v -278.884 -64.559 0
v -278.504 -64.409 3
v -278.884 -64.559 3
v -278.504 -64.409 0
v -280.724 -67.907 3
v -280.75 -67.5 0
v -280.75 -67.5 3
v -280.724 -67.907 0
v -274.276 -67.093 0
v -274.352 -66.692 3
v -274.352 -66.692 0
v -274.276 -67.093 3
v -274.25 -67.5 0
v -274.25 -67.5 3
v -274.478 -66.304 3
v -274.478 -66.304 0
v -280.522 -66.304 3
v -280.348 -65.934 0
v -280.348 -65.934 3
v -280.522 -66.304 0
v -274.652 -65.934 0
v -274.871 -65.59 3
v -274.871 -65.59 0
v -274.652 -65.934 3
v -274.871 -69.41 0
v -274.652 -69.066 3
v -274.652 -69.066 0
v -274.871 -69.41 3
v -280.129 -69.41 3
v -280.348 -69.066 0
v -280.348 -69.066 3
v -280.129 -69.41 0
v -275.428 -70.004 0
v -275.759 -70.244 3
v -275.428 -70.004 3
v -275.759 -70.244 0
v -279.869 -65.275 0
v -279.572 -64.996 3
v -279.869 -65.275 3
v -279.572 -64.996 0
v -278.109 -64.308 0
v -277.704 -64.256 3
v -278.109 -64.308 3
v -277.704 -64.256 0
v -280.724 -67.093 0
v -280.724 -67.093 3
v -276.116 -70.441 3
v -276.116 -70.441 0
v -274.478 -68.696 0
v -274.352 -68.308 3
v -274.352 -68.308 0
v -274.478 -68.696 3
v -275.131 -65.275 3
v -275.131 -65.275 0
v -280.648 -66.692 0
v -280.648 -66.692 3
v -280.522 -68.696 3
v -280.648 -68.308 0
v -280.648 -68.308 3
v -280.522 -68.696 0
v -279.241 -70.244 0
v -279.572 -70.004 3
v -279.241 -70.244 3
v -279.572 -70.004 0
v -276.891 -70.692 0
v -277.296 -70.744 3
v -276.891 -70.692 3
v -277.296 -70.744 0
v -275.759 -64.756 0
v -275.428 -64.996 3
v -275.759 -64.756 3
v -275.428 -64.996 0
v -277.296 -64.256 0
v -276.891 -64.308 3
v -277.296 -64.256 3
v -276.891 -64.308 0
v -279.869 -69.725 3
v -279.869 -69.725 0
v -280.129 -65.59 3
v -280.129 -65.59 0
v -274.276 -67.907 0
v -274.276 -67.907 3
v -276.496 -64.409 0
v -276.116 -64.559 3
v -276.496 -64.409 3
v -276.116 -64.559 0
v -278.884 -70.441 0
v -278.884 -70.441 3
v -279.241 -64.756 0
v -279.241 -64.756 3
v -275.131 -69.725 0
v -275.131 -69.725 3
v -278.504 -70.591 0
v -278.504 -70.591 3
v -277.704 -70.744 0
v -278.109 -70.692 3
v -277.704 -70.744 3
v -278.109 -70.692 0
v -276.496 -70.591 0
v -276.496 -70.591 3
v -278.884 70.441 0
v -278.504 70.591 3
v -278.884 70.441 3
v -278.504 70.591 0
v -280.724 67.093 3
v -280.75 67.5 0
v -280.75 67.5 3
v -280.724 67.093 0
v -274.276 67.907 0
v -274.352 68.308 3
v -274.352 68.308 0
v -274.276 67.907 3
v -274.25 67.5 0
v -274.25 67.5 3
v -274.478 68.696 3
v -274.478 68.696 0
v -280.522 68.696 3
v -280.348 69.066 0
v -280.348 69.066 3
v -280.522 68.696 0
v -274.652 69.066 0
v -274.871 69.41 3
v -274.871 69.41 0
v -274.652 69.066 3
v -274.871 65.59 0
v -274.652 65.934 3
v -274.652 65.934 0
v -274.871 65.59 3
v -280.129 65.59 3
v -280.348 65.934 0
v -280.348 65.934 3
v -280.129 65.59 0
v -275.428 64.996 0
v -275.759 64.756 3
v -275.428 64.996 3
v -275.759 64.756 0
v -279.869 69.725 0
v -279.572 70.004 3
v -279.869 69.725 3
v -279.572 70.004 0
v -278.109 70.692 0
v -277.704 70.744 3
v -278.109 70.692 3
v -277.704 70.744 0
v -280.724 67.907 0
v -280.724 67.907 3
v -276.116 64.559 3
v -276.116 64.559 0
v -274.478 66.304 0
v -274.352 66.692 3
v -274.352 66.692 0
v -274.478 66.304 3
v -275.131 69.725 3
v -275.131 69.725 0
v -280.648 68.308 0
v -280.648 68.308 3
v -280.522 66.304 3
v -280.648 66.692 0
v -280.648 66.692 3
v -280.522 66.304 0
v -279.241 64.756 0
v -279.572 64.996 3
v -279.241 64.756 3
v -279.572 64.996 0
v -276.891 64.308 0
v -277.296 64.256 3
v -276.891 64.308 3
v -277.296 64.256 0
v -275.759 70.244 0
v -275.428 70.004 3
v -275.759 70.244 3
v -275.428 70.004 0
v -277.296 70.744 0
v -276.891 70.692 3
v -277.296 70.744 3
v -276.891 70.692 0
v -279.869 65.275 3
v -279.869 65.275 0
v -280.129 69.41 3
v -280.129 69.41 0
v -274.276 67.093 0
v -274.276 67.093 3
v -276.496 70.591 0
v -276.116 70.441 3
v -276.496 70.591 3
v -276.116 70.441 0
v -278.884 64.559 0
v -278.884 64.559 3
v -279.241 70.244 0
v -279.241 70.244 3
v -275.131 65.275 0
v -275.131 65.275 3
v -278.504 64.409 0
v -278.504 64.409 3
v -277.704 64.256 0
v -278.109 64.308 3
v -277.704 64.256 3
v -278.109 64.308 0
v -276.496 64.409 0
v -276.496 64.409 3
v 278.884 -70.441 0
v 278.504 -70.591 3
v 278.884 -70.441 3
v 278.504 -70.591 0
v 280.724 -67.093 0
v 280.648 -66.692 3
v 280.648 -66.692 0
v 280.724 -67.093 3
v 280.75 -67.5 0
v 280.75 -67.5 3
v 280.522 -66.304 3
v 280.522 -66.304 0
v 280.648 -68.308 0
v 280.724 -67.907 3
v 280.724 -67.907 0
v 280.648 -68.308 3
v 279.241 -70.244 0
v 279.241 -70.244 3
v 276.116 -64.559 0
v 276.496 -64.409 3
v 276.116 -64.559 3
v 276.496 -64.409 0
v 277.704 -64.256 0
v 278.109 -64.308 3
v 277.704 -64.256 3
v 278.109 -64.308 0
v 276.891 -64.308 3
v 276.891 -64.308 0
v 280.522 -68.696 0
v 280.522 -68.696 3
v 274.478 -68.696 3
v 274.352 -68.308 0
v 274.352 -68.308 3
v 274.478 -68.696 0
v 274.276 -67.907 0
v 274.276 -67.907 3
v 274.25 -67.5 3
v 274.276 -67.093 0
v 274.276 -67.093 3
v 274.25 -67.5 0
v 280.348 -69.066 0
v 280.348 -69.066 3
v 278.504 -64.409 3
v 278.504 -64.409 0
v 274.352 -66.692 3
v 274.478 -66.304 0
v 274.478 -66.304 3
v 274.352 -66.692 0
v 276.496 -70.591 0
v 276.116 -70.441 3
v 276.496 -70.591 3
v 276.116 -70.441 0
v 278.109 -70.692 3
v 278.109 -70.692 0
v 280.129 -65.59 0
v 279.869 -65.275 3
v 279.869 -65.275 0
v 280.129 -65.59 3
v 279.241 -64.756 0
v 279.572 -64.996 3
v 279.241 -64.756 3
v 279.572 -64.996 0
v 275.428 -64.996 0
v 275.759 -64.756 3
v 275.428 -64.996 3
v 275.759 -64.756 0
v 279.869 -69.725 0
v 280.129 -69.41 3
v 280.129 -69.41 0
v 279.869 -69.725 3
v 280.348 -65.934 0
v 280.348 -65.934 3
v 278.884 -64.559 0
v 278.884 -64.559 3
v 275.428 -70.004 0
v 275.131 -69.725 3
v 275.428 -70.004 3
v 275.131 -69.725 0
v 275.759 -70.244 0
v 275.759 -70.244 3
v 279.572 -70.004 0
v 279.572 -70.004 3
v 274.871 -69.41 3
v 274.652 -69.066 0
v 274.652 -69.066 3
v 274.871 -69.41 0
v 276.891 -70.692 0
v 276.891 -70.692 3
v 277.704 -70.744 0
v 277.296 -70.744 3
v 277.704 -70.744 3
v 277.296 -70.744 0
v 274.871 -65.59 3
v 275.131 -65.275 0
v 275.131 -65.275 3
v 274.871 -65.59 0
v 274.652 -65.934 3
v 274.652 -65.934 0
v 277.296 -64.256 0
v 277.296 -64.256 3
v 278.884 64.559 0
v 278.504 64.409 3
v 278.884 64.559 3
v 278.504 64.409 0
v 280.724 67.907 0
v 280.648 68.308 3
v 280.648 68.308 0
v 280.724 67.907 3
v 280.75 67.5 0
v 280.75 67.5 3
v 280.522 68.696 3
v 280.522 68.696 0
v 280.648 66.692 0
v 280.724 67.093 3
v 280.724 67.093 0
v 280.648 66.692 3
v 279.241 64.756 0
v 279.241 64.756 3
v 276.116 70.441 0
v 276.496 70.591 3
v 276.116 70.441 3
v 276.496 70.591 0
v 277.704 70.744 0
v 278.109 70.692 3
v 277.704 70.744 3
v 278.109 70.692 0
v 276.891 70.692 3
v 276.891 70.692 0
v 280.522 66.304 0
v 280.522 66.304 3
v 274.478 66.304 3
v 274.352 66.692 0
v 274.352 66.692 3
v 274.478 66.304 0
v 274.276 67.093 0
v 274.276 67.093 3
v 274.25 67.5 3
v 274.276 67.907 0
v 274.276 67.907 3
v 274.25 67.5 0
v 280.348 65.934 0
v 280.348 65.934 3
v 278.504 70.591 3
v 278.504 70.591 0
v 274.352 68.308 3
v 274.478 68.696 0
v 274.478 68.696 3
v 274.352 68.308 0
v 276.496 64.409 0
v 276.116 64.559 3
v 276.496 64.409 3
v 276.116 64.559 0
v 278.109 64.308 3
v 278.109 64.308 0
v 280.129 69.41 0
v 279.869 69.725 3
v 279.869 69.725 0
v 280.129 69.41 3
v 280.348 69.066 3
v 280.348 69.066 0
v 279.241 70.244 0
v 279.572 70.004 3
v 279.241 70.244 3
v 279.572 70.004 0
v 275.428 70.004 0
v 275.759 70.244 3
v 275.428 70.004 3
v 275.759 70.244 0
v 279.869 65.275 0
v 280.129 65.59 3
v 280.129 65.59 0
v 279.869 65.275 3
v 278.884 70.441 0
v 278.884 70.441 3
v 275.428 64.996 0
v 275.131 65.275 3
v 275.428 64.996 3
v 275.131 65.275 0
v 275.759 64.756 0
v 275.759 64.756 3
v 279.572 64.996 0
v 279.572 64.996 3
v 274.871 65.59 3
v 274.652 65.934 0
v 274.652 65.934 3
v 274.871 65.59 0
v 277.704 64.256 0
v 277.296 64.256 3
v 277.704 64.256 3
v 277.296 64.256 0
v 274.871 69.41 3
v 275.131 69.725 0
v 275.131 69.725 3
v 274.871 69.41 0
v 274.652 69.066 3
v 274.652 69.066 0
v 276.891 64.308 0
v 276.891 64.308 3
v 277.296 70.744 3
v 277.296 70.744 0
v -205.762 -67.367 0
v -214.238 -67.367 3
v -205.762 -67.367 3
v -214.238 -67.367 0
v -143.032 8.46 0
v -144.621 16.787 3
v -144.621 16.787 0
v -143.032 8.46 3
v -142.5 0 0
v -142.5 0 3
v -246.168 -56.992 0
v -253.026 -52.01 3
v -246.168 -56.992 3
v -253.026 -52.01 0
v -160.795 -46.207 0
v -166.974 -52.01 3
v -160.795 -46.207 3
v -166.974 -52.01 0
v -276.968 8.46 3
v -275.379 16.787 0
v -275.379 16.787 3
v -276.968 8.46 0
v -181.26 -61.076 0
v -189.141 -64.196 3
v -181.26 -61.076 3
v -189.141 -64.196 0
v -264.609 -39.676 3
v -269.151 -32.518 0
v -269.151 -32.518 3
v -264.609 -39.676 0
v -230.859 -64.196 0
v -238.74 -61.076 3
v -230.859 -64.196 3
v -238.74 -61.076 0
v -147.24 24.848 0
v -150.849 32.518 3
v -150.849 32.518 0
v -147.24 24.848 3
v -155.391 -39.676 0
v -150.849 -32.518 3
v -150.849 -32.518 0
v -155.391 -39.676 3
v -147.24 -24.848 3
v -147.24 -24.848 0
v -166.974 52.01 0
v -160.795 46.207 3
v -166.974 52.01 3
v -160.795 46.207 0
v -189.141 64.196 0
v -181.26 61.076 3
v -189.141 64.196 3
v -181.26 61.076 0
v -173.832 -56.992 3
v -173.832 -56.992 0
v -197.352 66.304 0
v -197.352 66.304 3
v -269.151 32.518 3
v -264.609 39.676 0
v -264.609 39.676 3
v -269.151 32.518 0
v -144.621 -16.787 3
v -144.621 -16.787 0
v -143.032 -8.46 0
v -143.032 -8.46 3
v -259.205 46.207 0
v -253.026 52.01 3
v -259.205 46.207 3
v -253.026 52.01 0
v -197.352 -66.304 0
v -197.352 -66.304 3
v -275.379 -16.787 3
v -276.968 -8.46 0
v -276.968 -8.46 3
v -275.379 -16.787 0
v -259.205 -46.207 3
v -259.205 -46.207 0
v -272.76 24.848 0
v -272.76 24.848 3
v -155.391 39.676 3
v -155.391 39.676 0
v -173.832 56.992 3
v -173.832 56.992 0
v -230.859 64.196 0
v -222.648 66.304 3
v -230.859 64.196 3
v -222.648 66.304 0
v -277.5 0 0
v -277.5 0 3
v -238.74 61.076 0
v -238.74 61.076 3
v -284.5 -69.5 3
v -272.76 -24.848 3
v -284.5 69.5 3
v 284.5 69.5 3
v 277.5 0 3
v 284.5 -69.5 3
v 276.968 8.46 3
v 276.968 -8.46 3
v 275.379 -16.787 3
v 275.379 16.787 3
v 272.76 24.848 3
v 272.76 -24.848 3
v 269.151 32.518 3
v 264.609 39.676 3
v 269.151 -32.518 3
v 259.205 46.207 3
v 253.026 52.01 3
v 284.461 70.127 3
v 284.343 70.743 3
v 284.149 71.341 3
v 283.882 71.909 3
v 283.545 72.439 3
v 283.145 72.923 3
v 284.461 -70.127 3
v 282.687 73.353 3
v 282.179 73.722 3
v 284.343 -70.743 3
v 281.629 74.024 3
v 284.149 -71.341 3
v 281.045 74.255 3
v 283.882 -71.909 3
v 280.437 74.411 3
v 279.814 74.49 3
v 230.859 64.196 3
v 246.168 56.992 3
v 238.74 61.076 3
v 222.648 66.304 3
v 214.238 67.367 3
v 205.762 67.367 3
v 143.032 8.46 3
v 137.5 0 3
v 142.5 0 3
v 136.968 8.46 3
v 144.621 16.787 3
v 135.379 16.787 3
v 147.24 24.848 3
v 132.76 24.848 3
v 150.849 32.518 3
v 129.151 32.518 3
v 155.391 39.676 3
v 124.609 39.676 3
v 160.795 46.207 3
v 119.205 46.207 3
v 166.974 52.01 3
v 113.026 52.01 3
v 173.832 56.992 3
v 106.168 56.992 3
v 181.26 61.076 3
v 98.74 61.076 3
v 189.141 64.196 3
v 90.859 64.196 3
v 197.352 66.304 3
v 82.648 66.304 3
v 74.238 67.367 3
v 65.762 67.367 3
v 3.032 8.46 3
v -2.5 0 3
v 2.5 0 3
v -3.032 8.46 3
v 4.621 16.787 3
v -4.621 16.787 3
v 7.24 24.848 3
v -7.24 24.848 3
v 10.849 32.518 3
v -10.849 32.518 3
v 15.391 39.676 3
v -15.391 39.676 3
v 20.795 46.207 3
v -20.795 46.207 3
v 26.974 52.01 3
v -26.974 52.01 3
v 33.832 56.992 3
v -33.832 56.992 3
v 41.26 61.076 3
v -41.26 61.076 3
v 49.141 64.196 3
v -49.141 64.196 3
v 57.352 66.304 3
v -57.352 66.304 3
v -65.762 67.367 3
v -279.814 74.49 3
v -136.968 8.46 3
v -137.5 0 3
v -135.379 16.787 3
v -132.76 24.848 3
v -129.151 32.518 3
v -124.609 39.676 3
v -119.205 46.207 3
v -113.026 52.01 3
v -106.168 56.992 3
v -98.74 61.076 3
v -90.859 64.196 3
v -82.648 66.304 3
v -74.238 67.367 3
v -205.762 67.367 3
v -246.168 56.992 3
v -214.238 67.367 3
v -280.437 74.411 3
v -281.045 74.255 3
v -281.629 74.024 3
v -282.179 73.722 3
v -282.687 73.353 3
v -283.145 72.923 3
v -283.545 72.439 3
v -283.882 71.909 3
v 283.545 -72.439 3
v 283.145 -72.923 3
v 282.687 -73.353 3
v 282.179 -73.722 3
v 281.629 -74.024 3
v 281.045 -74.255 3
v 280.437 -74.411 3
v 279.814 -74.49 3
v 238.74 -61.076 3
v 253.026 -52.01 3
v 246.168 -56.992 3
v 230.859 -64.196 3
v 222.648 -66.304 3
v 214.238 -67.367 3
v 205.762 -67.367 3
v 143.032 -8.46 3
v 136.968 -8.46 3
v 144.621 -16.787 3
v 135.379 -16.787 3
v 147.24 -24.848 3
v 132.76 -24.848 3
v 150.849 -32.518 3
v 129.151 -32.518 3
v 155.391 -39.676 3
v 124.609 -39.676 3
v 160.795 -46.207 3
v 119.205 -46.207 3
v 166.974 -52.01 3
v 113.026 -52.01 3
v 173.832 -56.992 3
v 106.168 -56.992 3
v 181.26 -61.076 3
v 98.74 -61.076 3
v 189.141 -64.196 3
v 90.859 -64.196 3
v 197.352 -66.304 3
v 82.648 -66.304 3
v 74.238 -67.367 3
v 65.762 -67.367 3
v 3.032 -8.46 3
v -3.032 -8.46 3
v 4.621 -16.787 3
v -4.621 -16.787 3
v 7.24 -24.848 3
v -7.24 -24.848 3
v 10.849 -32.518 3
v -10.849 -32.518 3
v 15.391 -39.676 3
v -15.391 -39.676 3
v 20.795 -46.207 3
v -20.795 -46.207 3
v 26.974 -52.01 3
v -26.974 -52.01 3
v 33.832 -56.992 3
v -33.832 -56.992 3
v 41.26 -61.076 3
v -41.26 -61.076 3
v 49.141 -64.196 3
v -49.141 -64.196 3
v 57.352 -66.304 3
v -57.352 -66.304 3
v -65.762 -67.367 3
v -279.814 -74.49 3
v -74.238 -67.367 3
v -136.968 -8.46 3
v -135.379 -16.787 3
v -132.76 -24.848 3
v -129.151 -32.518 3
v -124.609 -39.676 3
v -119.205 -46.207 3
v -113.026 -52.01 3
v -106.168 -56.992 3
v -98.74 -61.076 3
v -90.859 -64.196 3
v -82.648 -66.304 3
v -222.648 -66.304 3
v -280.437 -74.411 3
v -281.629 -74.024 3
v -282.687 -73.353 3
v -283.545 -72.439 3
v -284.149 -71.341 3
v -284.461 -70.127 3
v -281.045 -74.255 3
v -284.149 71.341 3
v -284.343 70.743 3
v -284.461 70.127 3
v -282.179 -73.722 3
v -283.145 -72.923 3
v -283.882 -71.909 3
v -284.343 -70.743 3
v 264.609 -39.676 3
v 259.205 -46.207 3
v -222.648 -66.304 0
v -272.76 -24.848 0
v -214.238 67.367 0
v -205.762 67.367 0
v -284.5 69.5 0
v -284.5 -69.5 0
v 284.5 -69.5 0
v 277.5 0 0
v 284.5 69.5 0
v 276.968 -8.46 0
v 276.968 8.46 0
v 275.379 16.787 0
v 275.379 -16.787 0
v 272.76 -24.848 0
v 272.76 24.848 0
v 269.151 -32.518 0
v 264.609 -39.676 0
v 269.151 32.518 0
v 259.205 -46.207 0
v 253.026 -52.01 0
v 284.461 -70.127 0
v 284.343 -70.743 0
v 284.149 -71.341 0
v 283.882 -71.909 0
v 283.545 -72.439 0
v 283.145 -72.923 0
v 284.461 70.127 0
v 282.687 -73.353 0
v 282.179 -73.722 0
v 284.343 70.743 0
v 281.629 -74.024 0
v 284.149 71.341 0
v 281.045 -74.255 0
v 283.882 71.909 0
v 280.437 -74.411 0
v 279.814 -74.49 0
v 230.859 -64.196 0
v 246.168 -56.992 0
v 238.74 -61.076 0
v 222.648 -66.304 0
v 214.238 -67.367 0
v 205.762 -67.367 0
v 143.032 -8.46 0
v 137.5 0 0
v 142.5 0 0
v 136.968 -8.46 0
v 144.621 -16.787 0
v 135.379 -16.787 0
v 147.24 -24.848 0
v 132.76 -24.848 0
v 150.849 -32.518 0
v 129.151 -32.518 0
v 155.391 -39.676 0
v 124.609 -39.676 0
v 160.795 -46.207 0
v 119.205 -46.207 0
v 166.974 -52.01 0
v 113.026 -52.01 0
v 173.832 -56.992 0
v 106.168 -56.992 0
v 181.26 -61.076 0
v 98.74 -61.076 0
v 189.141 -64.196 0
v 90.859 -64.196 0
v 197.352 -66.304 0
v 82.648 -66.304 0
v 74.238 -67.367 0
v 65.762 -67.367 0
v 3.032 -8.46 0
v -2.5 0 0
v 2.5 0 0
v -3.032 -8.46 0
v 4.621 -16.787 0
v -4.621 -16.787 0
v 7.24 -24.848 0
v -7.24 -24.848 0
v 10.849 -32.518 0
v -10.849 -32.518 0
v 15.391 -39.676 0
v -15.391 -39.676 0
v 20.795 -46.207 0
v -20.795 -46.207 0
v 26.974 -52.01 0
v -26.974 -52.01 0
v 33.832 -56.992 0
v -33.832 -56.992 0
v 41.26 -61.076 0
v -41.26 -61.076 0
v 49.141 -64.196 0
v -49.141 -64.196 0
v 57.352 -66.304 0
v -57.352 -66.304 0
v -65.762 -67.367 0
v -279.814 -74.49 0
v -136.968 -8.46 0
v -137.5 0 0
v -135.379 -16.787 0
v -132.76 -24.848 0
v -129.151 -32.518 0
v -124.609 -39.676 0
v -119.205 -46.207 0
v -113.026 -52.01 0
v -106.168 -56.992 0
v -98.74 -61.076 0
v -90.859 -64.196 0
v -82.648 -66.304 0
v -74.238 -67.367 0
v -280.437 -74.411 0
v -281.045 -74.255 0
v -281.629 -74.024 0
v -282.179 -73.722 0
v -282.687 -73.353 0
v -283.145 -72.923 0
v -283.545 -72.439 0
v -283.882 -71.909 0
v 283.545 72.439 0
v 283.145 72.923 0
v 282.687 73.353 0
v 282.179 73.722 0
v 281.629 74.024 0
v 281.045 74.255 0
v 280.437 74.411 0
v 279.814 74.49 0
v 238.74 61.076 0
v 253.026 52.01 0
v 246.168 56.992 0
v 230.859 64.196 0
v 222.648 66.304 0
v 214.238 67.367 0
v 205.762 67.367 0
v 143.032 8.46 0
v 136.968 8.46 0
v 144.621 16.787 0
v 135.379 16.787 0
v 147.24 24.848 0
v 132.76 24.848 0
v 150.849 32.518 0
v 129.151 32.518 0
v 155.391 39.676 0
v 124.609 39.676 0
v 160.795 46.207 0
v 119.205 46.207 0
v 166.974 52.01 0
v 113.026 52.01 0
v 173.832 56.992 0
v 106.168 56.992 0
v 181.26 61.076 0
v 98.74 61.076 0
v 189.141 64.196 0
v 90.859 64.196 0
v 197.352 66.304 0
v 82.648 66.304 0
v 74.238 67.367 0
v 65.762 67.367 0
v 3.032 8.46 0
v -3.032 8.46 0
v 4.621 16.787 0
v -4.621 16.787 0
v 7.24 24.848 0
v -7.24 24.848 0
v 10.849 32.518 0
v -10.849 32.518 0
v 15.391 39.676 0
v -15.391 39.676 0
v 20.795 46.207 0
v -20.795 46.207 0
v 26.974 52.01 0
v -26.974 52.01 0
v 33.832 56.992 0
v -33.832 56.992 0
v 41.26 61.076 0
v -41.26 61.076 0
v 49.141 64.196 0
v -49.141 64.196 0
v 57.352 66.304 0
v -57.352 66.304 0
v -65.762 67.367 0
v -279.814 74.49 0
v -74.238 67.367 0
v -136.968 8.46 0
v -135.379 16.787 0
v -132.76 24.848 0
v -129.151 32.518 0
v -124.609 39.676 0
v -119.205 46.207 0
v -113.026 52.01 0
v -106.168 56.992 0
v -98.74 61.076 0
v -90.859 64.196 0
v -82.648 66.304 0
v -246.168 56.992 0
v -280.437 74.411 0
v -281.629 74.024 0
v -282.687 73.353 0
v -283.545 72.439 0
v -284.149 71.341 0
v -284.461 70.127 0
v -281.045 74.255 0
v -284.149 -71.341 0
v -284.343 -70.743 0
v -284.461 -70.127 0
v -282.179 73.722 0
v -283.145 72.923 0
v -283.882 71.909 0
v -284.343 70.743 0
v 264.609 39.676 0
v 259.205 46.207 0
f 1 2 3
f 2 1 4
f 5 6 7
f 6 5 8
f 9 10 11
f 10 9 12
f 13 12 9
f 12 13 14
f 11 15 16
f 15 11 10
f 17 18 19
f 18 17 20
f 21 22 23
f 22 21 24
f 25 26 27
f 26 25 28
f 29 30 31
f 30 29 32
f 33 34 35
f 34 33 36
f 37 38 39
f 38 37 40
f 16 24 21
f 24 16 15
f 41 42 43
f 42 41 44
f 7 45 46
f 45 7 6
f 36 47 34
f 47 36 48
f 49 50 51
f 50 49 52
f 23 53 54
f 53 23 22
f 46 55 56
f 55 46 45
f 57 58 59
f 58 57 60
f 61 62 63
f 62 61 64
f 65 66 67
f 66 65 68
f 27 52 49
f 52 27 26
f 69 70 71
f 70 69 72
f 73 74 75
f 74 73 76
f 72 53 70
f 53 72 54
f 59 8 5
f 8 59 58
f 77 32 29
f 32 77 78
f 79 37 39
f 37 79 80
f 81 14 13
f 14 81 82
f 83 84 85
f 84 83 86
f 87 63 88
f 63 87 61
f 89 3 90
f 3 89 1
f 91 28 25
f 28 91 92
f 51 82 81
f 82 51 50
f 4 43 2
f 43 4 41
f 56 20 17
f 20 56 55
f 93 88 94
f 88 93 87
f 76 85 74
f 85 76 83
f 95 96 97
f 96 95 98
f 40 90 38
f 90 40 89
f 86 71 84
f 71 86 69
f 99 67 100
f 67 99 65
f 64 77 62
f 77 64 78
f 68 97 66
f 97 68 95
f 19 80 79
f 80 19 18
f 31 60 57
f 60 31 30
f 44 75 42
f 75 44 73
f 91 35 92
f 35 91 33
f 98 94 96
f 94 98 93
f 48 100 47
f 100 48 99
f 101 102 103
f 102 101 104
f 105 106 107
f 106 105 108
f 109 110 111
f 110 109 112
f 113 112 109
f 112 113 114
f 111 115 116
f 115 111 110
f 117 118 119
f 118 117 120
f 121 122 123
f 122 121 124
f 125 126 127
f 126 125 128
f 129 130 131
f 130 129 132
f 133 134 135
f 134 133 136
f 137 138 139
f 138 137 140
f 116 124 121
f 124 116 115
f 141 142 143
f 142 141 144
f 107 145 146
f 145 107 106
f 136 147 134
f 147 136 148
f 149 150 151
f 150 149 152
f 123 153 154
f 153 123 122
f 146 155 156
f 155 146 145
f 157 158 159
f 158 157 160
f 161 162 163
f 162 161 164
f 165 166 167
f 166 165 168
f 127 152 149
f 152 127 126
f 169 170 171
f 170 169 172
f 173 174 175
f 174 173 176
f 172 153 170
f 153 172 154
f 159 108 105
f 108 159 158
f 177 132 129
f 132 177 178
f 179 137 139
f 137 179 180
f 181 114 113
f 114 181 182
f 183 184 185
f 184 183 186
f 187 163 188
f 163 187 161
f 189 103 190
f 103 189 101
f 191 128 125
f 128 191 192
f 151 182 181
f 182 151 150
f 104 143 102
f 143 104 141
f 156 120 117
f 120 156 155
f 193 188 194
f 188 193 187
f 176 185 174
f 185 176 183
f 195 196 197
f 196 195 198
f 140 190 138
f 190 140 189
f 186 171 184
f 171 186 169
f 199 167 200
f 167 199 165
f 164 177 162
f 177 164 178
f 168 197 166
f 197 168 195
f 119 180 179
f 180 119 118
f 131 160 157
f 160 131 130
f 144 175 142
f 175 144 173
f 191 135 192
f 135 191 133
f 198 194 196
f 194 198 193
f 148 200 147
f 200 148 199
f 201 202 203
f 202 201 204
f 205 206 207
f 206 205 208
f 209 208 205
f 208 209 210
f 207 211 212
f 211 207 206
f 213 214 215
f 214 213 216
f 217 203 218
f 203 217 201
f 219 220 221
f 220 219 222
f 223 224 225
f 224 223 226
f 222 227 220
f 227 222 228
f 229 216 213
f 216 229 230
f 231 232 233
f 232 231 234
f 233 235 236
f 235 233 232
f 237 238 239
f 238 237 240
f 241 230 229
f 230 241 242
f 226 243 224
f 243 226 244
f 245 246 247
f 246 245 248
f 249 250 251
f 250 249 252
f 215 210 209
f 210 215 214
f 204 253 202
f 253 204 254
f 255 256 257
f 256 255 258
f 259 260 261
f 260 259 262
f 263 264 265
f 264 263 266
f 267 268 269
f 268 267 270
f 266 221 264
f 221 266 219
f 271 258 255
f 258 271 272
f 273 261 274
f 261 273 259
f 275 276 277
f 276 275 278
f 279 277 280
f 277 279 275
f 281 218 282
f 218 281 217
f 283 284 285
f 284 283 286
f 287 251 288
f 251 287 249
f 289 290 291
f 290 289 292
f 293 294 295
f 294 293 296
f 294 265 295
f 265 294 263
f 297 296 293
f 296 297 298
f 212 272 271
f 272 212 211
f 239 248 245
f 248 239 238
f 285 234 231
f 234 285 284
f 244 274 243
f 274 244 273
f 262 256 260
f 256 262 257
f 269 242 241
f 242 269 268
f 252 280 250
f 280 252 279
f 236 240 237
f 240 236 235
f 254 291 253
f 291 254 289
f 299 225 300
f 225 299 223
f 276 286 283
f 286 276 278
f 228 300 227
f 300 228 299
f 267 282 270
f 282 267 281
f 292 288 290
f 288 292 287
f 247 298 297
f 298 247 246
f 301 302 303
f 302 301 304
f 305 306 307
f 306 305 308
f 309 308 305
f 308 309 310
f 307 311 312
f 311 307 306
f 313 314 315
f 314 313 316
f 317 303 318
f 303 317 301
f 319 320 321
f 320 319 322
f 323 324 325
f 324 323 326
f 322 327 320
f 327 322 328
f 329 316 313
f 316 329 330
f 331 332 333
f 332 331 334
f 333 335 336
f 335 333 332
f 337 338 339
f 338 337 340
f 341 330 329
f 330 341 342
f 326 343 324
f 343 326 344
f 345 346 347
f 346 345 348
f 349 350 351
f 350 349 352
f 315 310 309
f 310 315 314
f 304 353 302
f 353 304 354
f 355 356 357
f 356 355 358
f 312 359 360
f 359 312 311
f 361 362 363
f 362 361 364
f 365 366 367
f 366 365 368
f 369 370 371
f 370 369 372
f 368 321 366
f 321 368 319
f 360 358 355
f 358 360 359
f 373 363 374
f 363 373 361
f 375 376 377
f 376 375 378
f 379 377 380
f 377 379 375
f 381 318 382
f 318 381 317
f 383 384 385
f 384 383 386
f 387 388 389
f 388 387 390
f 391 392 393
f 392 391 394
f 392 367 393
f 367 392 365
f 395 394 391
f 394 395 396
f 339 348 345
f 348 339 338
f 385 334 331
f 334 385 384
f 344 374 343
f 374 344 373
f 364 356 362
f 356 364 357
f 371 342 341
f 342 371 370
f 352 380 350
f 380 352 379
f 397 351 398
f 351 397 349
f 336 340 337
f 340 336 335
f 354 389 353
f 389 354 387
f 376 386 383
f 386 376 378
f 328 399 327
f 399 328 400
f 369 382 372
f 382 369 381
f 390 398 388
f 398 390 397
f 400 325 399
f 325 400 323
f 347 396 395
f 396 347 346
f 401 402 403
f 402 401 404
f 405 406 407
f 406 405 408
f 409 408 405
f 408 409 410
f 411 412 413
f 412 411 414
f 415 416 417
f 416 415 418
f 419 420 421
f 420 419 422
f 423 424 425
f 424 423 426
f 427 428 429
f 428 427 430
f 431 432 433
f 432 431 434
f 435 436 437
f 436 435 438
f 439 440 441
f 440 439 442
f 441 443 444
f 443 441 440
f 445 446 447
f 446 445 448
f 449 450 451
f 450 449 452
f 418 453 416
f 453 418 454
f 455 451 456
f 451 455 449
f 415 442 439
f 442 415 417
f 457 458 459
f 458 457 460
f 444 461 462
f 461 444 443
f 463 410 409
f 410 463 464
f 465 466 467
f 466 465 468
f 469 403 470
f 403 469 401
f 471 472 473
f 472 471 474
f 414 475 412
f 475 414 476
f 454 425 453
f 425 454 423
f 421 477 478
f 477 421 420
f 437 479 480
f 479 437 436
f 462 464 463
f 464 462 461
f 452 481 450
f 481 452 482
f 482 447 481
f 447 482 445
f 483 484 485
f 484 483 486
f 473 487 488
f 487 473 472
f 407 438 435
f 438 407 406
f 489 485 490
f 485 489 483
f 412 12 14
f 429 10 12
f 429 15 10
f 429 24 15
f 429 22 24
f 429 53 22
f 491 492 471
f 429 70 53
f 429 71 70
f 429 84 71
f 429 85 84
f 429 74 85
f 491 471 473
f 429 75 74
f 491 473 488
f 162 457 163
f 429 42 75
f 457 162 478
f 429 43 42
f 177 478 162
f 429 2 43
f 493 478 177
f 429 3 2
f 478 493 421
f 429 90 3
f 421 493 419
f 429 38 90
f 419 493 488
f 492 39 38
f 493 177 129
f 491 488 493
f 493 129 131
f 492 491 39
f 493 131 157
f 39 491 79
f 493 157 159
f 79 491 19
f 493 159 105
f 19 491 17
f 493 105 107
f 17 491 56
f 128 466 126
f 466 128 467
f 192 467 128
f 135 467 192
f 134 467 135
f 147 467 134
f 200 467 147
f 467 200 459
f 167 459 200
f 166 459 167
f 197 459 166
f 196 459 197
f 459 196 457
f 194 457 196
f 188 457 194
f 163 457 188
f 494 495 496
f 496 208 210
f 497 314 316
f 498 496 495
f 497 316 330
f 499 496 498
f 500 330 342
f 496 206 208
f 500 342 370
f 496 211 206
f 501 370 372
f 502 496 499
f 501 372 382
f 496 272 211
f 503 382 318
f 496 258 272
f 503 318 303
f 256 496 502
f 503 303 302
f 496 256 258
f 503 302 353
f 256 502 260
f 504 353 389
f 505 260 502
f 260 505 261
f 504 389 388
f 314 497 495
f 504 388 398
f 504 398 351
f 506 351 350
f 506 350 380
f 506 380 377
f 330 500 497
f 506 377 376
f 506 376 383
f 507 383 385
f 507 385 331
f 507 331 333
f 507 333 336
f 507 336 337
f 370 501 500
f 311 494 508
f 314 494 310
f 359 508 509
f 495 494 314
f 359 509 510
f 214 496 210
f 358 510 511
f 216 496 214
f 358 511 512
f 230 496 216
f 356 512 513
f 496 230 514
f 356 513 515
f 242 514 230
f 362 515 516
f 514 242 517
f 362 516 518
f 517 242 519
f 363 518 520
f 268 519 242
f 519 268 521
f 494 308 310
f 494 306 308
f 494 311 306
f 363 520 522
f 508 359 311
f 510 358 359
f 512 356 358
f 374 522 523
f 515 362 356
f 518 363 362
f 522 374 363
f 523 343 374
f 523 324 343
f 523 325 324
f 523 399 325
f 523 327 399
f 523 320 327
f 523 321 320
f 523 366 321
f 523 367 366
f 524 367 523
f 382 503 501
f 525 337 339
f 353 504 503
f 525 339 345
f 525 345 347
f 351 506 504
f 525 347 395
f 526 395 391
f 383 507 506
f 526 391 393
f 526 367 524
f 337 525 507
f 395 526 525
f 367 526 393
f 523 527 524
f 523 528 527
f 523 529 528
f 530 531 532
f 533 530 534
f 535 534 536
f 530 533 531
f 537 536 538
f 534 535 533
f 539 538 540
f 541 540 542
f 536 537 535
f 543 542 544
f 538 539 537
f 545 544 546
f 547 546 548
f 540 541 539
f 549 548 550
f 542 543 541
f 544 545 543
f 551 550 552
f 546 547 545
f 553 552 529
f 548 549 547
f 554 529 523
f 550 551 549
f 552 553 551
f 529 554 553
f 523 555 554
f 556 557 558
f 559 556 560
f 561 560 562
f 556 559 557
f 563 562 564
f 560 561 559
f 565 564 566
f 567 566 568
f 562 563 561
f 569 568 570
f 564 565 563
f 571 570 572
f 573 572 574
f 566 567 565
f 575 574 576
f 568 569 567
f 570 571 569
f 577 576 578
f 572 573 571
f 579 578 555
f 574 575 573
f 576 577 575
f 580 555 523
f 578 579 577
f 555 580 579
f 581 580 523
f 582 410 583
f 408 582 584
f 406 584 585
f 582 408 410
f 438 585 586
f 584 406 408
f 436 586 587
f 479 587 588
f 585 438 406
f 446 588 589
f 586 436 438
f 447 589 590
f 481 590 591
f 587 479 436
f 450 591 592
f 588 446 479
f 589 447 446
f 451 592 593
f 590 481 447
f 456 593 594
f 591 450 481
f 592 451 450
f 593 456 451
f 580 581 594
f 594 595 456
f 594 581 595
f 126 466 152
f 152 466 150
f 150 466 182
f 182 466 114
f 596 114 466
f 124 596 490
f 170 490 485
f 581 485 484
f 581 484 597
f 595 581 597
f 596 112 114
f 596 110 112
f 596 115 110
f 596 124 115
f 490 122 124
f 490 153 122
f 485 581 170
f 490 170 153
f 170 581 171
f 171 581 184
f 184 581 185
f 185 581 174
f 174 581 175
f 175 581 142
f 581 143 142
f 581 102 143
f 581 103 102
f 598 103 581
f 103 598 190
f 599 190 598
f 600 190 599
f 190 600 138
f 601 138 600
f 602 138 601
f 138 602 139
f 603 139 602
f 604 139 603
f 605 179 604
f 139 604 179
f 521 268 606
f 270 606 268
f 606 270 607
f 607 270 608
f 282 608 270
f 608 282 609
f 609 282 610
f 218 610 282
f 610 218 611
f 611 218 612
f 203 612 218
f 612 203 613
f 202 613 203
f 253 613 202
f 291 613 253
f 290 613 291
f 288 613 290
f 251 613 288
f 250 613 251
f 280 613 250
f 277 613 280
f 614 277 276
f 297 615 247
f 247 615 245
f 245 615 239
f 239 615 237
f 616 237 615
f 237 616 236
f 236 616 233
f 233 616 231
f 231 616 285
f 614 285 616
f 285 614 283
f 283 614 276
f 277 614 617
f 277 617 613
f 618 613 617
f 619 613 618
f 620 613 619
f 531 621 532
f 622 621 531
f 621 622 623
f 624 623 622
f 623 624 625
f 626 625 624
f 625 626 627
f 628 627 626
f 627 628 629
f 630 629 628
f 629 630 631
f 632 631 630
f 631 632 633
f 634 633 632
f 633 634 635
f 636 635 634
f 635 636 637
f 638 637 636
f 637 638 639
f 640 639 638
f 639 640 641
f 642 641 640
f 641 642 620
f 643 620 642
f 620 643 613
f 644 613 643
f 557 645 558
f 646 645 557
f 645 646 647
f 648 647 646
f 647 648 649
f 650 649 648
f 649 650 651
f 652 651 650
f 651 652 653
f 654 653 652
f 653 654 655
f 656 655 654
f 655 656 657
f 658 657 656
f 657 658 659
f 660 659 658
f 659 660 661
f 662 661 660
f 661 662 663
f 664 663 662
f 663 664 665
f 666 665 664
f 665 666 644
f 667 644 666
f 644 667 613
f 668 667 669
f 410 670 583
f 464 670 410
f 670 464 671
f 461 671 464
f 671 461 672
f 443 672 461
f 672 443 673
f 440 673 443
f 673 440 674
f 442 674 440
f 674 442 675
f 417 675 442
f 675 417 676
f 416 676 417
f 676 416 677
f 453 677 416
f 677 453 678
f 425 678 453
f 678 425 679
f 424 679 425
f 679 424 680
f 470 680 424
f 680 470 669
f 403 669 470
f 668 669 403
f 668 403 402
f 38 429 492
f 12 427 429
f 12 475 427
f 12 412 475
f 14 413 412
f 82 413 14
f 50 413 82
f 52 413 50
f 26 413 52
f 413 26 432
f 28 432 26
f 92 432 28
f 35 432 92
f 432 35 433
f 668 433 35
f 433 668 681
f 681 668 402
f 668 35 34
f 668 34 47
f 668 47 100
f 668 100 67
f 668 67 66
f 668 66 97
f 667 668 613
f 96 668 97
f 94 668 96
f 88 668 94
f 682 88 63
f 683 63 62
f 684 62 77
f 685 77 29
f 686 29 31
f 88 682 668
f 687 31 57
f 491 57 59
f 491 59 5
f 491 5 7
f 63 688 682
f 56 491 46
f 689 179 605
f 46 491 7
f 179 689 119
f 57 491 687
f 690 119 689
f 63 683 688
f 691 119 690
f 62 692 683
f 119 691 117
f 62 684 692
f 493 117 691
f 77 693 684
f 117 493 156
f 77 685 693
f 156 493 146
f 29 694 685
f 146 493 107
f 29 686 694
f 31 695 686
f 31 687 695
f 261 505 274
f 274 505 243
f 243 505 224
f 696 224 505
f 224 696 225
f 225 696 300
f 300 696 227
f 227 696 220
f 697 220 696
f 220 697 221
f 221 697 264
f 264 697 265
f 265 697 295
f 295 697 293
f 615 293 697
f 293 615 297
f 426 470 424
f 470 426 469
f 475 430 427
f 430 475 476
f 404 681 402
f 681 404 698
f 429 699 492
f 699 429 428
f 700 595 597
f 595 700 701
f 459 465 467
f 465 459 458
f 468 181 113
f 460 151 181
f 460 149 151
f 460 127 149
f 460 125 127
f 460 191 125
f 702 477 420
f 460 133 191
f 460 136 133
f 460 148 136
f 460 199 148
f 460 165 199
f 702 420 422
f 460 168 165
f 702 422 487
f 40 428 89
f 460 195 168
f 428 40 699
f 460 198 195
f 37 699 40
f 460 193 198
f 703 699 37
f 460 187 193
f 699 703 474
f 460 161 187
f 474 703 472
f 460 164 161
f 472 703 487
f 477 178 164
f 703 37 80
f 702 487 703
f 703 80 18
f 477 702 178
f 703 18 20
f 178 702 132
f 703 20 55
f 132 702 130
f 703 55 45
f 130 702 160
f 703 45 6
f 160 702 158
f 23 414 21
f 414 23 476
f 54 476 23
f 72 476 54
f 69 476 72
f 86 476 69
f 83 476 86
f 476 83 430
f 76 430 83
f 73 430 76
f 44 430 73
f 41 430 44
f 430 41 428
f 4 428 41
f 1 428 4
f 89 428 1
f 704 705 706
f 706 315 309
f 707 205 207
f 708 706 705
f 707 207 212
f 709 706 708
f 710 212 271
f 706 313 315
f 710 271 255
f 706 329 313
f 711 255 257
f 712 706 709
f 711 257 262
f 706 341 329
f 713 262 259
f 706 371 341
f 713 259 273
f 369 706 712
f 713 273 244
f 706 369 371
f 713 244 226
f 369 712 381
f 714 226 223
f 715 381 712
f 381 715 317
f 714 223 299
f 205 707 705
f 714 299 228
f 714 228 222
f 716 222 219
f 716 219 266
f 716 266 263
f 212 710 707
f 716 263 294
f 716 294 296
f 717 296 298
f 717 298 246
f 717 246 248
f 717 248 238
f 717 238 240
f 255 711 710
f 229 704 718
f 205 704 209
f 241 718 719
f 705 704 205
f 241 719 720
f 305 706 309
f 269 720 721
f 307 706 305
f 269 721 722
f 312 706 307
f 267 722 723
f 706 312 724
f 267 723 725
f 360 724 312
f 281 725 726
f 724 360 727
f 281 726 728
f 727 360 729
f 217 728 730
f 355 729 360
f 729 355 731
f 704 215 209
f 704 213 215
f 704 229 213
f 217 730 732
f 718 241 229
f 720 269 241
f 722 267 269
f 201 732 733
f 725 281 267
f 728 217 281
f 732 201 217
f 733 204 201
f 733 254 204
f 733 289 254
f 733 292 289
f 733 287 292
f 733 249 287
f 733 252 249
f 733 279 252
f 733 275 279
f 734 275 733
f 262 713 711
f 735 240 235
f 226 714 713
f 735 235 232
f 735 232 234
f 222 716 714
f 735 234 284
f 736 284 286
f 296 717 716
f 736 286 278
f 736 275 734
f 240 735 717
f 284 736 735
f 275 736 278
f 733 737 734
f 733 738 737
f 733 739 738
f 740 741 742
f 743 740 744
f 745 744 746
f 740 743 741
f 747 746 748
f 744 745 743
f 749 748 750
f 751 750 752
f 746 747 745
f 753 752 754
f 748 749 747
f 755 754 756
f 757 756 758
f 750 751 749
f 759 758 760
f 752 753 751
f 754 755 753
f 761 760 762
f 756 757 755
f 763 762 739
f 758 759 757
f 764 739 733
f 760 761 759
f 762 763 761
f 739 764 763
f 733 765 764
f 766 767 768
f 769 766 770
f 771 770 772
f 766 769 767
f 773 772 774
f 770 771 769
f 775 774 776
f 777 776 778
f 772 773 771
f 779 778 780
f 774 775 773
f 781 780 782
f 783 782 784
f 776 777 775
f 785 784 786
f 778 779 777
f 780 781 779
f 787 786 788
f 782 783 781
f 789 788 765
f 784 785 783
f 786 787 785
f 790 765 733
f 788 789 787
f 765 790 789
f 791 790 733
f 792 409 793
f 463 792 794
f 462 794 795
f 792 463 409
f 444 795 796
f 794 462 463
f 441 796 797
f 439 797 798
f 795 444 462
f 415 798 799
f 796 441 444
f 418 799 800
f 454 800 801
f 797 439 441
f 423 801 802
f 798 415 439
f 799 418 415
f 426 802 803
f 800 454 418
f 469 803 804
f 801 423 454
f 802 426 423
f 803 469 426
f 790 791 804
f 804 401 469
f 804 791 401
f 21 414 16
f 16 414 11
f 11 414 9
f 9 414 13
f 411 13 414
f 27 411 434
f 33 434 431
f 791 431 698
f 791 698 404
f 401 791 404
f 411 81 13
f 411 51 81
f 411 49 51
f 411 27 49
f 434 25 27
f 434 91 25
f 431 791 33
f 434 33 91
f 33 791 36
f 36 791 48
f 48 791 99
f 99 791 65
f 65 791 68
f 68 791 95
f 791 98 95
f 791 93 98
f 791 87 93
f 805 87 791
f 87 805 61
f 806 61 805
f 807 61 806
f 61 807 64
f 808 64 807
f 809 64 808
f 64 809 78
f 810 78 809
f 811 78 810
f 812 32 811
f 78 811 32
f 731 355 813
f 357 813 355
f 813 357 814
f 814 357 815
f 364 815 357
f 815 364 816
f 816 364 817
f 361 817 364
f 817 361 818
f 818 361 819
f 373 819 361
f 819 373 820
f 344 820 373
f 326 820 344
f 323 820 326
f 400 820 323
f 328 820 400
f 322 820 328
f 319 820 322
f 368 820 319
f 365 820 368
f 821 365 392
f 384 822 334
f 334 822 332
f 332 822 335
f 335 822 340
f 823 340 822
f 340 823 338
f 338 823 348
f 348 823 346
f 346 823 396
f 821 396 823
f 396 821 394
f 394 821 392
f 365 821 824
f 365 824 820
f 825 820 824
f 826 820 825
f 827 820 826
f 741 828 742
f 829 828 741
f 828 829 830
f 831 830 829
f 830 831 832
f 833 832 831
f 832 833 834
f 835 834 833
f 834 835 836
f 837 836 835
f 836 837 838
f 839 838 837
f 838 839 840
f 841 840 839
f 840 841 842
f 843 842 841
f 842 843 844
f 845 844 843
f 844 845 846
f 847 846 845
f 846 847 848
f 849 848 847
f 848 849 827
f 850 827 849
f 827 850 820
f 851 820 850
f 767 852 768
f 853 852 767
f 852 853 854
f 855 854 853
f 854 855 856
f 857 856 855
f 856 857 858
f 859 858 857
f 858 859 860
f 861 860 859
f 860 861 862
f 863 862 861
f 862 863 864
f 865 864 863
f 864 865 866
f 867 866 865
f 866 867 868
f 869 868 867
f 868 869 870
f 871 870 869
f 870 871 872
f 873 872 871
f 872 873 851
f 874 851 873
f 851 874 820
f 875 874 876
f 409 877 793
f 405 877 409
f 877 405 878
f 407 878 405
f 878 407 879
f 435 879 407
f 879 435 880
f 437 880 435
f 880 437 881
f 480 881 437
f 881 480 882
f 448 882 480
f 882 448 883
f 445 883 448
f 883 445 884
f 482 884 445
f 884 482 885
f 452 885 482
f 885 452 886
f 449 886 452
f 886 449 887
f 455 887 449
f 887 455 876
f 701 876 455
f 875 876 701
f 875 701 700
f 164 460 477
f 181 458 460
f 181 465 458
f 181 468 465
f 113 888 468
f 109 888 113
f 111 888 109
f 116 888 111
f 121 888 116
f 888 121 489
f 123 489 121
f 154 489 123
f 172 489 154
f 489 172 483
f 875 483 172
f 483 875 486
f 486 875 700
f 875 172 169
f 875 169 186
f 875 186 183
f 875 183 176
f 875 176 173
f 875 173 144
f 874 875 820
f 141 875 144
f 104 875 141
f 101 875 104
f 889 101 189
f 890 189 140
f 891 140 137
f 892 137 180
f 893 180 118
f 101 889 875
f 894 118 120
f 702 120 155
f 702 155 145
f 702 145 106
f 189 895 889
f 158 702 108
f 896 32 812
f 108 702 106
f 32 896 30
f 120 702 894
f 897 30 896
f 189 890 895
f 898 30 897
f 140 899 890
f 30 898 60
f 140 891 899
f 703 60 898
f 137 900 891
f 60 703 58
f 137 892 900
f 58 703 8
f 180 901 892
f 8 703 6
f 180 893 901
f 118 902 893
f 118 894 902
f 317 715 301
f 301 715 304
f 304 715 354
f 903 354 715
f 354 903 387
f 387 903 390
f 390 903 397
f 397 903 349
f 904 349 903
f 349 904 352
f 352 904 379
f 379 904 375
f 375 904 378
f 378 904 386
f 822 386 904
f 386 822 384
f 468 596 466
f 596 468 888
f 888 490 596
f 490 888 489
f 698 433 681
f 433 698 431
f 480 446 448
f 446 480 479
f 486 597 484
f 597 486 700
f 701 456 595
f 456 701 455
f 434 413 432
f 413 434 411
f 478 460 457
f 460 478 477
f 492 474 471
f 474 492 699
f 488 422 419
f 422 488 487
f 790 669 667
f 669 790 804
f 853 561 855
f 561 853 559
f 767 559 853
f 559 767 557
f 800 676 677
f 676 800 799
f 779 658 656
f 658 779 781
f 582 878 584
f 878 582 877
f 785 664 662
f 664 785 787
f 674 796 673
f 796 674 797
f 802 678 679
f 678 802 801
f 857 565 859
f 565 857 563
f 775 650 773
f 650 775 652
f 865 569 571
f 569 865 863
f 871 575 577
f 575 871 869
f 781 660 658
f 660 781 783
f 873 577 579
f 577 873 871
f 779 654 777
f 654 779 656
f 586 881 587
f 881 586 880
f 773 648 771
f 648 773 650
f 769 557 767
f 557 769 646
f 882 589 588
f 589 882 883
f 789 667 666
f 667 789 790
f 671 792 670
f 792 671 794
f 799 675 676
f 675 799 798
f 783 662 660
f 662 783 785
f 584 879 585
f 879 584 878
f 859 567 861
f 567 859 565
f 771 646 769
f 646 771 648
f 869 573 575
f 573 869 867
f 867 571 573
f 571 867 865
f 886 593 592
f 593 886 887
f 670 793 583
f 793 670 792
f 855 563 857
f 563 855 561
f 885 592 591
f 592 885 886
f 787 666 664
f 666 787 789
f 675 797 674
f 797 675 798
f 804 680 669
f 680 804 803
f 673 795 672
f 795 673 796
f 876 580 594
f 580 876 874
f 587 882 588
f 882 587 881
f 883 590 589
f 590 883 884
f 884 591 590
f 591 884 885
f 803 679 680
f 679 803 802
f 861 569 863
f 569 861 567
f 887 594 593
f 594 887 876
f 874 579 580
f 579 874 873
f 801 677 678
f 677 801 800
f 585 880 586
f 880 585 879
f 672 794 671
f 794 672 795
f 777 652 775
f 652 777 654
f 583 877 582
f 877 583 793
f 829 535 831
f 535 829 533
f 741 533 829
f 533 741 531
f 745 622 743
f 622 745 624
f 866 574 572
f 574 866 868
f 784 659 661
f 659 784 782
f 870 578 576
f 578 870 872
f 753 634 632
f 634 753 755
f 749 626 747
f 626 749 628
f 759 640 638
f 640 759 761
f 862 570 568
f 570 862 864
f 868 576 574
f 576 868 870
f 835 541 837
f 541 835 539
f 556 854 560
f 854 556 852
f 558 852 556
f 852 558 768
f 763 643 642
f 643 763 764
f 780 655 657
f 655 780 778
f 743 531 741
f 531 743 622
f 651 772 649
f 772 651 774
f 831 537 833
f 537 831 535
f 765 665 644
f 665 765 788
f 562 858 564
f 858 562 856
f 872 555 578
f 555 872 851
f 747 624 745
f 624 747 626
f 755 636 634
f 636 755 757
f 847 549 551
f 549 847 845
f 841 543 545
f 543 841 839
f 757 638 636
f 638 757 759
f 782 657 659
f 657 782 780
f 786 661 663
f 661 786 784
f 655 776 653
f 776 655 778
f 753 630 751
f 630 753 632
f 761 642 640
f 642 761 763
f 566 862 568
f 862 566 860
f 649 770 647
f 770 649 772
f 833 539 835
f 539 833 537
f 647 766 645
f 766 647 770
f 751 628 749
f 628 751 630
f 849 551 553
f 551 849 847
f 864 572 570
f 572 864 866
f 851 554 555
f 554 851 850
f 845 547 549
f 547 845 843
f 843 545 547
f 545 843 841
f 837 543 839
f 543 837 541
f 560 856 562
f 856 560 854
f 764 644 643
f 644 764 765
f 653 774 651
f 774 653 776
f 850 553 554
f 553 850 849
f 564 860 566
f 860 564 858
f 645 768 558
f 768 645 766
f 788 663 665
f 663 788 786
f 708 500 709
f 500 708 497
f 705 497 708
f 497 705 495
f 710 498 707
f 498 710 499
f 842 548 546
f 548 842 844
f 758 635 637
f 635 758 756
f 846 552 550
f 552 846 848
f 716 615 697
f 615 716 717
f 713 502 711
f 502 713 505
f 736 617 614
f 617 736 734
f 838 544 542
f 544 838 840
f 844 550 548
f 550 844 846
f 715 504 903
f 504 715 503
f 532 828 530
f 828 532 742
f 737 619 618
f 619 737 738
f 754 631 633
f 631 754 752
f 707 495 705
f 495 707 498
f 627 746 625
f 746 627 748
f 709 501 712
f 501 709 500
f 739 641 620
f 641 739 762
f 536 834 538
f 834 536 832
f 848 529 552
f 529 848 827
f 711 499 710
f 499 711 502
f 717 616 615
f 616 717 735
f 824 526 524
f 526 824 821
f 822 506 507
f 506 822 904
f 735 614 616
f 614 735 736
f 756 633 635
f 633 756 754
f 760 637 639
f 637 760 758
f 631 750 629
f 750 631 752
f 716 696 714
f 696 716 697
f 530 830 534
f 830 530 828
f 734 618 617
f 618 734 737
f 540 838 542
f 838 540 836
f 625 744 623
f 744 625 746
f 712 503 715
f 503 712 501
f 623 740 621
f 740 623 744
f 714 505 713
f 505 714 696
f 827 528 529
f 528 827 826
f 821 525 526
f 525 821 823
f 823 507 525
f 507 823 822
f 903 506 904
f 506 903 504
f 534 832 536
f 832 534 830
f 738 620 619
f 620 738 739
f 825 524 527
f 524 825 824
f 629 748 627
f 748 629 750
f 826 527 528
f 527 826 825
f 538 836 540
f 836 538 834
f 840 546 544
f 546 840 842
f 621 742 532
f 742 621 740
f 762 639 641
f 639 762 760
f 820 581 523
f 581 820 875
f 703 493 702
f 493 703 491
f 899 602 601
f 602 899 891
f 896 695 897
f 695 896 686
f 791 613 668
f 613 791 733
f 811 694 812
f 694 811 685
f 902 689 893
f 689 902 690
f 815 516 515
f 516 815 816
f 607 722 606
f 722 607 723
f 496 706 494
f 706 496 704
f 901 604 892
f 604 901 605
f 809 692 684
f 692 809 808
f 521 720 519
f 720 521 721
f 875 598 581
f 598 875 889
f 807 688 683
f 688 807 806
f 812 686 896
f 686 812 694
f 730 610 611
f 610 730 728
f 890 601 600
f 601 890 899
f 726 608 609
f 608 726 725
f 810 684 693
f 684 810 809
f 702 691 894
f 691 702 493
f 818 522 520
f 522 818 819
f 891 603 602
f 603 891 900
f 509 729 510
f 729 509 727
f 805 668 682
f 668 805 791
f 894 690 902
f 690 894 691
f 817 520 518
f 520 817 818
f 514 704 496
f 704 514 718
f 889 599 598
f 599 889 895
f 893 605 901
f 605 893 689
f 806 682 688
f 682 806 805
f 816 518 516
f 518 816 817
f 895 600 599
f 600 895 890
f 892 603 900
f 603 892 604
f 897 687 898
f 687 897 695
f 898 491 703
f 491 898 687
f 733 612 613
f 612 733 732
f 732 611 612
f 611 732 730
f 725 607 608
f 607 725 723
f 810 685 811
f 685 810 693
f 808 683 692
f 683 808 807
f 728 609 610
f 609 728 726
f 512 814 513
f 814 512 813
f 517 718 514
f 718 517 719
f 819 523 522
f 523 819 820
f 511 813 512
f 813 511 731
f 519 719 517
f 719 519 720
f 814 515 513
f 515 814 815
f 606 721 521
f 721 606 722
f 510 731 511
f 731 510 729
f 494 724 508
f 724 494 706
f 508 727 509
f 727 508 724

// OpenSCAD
$fn = 50;

difference() {
	union() {
		hull() {
			translate(v = [-279.5, 69.5, 0]) {
				cylinder(h = 3, r = 5);
			}
			translate(v = [279.5, 69.5, 0]) {
				cylinder(h = 3, r = 5);
			}
			translate(v = [-279.5, -69.5, 0]) {
				cylinder(h = 3, r = 5);
			}
			translate(v = [279.5, -69.5, 0]) {
				cylinder(h = 3, r = 5);
			}
		}
	}
	union() {
		translate(v = [-277.5, -67.5, -100.0]) {
			cylinder(h = 200, r = 3.25);
		}
		translate(v = [-277.5, 67.5, -100.0]) {
			cylinder(h = 200, r = 3.25);
		}
		translate(v = [277.5, -67.5, -100.0]) {
			cylinder(h = 200, r = 3.25);
		}
		translate(v = [277.5, 67.5, -100.0]) {
			cylinder(h = 200, r = 3.25);
		}
		translate(v = [-277.5, -67.5, -100.0]) {
			cylinder(h = 200, r = 1.8);
		}
		translate(v = [-277.5, 67.5, -100.0]) {
			cylinder(h = 200, r = 1.8);
		}
		translate(v = [277.5, -67.5, -100.0]) {
			cylinder(h = 200, r = 1.8);
		}
		translate(v = [277.5, 67.5, -100.0]) {
			cylinder(h = 200, r = 1.8);
		}
		translate(v = [-210.0, 0, 0.0]) {
			cylinder(h = 3, r = 67.5);
		}
		translate(v = [-70.0, 0, 0.0]) {
			cylinder(h = 3, r = 67.5);
		}
		translate(v = [70.0, 0, 0.0]) {
			cylinder(h = 3, r = 67.5);
		}
		translate(v = [210.0, 0, 0.0]) {
			cylinder(h = 3, r = 67.5);
		}
	}
}
